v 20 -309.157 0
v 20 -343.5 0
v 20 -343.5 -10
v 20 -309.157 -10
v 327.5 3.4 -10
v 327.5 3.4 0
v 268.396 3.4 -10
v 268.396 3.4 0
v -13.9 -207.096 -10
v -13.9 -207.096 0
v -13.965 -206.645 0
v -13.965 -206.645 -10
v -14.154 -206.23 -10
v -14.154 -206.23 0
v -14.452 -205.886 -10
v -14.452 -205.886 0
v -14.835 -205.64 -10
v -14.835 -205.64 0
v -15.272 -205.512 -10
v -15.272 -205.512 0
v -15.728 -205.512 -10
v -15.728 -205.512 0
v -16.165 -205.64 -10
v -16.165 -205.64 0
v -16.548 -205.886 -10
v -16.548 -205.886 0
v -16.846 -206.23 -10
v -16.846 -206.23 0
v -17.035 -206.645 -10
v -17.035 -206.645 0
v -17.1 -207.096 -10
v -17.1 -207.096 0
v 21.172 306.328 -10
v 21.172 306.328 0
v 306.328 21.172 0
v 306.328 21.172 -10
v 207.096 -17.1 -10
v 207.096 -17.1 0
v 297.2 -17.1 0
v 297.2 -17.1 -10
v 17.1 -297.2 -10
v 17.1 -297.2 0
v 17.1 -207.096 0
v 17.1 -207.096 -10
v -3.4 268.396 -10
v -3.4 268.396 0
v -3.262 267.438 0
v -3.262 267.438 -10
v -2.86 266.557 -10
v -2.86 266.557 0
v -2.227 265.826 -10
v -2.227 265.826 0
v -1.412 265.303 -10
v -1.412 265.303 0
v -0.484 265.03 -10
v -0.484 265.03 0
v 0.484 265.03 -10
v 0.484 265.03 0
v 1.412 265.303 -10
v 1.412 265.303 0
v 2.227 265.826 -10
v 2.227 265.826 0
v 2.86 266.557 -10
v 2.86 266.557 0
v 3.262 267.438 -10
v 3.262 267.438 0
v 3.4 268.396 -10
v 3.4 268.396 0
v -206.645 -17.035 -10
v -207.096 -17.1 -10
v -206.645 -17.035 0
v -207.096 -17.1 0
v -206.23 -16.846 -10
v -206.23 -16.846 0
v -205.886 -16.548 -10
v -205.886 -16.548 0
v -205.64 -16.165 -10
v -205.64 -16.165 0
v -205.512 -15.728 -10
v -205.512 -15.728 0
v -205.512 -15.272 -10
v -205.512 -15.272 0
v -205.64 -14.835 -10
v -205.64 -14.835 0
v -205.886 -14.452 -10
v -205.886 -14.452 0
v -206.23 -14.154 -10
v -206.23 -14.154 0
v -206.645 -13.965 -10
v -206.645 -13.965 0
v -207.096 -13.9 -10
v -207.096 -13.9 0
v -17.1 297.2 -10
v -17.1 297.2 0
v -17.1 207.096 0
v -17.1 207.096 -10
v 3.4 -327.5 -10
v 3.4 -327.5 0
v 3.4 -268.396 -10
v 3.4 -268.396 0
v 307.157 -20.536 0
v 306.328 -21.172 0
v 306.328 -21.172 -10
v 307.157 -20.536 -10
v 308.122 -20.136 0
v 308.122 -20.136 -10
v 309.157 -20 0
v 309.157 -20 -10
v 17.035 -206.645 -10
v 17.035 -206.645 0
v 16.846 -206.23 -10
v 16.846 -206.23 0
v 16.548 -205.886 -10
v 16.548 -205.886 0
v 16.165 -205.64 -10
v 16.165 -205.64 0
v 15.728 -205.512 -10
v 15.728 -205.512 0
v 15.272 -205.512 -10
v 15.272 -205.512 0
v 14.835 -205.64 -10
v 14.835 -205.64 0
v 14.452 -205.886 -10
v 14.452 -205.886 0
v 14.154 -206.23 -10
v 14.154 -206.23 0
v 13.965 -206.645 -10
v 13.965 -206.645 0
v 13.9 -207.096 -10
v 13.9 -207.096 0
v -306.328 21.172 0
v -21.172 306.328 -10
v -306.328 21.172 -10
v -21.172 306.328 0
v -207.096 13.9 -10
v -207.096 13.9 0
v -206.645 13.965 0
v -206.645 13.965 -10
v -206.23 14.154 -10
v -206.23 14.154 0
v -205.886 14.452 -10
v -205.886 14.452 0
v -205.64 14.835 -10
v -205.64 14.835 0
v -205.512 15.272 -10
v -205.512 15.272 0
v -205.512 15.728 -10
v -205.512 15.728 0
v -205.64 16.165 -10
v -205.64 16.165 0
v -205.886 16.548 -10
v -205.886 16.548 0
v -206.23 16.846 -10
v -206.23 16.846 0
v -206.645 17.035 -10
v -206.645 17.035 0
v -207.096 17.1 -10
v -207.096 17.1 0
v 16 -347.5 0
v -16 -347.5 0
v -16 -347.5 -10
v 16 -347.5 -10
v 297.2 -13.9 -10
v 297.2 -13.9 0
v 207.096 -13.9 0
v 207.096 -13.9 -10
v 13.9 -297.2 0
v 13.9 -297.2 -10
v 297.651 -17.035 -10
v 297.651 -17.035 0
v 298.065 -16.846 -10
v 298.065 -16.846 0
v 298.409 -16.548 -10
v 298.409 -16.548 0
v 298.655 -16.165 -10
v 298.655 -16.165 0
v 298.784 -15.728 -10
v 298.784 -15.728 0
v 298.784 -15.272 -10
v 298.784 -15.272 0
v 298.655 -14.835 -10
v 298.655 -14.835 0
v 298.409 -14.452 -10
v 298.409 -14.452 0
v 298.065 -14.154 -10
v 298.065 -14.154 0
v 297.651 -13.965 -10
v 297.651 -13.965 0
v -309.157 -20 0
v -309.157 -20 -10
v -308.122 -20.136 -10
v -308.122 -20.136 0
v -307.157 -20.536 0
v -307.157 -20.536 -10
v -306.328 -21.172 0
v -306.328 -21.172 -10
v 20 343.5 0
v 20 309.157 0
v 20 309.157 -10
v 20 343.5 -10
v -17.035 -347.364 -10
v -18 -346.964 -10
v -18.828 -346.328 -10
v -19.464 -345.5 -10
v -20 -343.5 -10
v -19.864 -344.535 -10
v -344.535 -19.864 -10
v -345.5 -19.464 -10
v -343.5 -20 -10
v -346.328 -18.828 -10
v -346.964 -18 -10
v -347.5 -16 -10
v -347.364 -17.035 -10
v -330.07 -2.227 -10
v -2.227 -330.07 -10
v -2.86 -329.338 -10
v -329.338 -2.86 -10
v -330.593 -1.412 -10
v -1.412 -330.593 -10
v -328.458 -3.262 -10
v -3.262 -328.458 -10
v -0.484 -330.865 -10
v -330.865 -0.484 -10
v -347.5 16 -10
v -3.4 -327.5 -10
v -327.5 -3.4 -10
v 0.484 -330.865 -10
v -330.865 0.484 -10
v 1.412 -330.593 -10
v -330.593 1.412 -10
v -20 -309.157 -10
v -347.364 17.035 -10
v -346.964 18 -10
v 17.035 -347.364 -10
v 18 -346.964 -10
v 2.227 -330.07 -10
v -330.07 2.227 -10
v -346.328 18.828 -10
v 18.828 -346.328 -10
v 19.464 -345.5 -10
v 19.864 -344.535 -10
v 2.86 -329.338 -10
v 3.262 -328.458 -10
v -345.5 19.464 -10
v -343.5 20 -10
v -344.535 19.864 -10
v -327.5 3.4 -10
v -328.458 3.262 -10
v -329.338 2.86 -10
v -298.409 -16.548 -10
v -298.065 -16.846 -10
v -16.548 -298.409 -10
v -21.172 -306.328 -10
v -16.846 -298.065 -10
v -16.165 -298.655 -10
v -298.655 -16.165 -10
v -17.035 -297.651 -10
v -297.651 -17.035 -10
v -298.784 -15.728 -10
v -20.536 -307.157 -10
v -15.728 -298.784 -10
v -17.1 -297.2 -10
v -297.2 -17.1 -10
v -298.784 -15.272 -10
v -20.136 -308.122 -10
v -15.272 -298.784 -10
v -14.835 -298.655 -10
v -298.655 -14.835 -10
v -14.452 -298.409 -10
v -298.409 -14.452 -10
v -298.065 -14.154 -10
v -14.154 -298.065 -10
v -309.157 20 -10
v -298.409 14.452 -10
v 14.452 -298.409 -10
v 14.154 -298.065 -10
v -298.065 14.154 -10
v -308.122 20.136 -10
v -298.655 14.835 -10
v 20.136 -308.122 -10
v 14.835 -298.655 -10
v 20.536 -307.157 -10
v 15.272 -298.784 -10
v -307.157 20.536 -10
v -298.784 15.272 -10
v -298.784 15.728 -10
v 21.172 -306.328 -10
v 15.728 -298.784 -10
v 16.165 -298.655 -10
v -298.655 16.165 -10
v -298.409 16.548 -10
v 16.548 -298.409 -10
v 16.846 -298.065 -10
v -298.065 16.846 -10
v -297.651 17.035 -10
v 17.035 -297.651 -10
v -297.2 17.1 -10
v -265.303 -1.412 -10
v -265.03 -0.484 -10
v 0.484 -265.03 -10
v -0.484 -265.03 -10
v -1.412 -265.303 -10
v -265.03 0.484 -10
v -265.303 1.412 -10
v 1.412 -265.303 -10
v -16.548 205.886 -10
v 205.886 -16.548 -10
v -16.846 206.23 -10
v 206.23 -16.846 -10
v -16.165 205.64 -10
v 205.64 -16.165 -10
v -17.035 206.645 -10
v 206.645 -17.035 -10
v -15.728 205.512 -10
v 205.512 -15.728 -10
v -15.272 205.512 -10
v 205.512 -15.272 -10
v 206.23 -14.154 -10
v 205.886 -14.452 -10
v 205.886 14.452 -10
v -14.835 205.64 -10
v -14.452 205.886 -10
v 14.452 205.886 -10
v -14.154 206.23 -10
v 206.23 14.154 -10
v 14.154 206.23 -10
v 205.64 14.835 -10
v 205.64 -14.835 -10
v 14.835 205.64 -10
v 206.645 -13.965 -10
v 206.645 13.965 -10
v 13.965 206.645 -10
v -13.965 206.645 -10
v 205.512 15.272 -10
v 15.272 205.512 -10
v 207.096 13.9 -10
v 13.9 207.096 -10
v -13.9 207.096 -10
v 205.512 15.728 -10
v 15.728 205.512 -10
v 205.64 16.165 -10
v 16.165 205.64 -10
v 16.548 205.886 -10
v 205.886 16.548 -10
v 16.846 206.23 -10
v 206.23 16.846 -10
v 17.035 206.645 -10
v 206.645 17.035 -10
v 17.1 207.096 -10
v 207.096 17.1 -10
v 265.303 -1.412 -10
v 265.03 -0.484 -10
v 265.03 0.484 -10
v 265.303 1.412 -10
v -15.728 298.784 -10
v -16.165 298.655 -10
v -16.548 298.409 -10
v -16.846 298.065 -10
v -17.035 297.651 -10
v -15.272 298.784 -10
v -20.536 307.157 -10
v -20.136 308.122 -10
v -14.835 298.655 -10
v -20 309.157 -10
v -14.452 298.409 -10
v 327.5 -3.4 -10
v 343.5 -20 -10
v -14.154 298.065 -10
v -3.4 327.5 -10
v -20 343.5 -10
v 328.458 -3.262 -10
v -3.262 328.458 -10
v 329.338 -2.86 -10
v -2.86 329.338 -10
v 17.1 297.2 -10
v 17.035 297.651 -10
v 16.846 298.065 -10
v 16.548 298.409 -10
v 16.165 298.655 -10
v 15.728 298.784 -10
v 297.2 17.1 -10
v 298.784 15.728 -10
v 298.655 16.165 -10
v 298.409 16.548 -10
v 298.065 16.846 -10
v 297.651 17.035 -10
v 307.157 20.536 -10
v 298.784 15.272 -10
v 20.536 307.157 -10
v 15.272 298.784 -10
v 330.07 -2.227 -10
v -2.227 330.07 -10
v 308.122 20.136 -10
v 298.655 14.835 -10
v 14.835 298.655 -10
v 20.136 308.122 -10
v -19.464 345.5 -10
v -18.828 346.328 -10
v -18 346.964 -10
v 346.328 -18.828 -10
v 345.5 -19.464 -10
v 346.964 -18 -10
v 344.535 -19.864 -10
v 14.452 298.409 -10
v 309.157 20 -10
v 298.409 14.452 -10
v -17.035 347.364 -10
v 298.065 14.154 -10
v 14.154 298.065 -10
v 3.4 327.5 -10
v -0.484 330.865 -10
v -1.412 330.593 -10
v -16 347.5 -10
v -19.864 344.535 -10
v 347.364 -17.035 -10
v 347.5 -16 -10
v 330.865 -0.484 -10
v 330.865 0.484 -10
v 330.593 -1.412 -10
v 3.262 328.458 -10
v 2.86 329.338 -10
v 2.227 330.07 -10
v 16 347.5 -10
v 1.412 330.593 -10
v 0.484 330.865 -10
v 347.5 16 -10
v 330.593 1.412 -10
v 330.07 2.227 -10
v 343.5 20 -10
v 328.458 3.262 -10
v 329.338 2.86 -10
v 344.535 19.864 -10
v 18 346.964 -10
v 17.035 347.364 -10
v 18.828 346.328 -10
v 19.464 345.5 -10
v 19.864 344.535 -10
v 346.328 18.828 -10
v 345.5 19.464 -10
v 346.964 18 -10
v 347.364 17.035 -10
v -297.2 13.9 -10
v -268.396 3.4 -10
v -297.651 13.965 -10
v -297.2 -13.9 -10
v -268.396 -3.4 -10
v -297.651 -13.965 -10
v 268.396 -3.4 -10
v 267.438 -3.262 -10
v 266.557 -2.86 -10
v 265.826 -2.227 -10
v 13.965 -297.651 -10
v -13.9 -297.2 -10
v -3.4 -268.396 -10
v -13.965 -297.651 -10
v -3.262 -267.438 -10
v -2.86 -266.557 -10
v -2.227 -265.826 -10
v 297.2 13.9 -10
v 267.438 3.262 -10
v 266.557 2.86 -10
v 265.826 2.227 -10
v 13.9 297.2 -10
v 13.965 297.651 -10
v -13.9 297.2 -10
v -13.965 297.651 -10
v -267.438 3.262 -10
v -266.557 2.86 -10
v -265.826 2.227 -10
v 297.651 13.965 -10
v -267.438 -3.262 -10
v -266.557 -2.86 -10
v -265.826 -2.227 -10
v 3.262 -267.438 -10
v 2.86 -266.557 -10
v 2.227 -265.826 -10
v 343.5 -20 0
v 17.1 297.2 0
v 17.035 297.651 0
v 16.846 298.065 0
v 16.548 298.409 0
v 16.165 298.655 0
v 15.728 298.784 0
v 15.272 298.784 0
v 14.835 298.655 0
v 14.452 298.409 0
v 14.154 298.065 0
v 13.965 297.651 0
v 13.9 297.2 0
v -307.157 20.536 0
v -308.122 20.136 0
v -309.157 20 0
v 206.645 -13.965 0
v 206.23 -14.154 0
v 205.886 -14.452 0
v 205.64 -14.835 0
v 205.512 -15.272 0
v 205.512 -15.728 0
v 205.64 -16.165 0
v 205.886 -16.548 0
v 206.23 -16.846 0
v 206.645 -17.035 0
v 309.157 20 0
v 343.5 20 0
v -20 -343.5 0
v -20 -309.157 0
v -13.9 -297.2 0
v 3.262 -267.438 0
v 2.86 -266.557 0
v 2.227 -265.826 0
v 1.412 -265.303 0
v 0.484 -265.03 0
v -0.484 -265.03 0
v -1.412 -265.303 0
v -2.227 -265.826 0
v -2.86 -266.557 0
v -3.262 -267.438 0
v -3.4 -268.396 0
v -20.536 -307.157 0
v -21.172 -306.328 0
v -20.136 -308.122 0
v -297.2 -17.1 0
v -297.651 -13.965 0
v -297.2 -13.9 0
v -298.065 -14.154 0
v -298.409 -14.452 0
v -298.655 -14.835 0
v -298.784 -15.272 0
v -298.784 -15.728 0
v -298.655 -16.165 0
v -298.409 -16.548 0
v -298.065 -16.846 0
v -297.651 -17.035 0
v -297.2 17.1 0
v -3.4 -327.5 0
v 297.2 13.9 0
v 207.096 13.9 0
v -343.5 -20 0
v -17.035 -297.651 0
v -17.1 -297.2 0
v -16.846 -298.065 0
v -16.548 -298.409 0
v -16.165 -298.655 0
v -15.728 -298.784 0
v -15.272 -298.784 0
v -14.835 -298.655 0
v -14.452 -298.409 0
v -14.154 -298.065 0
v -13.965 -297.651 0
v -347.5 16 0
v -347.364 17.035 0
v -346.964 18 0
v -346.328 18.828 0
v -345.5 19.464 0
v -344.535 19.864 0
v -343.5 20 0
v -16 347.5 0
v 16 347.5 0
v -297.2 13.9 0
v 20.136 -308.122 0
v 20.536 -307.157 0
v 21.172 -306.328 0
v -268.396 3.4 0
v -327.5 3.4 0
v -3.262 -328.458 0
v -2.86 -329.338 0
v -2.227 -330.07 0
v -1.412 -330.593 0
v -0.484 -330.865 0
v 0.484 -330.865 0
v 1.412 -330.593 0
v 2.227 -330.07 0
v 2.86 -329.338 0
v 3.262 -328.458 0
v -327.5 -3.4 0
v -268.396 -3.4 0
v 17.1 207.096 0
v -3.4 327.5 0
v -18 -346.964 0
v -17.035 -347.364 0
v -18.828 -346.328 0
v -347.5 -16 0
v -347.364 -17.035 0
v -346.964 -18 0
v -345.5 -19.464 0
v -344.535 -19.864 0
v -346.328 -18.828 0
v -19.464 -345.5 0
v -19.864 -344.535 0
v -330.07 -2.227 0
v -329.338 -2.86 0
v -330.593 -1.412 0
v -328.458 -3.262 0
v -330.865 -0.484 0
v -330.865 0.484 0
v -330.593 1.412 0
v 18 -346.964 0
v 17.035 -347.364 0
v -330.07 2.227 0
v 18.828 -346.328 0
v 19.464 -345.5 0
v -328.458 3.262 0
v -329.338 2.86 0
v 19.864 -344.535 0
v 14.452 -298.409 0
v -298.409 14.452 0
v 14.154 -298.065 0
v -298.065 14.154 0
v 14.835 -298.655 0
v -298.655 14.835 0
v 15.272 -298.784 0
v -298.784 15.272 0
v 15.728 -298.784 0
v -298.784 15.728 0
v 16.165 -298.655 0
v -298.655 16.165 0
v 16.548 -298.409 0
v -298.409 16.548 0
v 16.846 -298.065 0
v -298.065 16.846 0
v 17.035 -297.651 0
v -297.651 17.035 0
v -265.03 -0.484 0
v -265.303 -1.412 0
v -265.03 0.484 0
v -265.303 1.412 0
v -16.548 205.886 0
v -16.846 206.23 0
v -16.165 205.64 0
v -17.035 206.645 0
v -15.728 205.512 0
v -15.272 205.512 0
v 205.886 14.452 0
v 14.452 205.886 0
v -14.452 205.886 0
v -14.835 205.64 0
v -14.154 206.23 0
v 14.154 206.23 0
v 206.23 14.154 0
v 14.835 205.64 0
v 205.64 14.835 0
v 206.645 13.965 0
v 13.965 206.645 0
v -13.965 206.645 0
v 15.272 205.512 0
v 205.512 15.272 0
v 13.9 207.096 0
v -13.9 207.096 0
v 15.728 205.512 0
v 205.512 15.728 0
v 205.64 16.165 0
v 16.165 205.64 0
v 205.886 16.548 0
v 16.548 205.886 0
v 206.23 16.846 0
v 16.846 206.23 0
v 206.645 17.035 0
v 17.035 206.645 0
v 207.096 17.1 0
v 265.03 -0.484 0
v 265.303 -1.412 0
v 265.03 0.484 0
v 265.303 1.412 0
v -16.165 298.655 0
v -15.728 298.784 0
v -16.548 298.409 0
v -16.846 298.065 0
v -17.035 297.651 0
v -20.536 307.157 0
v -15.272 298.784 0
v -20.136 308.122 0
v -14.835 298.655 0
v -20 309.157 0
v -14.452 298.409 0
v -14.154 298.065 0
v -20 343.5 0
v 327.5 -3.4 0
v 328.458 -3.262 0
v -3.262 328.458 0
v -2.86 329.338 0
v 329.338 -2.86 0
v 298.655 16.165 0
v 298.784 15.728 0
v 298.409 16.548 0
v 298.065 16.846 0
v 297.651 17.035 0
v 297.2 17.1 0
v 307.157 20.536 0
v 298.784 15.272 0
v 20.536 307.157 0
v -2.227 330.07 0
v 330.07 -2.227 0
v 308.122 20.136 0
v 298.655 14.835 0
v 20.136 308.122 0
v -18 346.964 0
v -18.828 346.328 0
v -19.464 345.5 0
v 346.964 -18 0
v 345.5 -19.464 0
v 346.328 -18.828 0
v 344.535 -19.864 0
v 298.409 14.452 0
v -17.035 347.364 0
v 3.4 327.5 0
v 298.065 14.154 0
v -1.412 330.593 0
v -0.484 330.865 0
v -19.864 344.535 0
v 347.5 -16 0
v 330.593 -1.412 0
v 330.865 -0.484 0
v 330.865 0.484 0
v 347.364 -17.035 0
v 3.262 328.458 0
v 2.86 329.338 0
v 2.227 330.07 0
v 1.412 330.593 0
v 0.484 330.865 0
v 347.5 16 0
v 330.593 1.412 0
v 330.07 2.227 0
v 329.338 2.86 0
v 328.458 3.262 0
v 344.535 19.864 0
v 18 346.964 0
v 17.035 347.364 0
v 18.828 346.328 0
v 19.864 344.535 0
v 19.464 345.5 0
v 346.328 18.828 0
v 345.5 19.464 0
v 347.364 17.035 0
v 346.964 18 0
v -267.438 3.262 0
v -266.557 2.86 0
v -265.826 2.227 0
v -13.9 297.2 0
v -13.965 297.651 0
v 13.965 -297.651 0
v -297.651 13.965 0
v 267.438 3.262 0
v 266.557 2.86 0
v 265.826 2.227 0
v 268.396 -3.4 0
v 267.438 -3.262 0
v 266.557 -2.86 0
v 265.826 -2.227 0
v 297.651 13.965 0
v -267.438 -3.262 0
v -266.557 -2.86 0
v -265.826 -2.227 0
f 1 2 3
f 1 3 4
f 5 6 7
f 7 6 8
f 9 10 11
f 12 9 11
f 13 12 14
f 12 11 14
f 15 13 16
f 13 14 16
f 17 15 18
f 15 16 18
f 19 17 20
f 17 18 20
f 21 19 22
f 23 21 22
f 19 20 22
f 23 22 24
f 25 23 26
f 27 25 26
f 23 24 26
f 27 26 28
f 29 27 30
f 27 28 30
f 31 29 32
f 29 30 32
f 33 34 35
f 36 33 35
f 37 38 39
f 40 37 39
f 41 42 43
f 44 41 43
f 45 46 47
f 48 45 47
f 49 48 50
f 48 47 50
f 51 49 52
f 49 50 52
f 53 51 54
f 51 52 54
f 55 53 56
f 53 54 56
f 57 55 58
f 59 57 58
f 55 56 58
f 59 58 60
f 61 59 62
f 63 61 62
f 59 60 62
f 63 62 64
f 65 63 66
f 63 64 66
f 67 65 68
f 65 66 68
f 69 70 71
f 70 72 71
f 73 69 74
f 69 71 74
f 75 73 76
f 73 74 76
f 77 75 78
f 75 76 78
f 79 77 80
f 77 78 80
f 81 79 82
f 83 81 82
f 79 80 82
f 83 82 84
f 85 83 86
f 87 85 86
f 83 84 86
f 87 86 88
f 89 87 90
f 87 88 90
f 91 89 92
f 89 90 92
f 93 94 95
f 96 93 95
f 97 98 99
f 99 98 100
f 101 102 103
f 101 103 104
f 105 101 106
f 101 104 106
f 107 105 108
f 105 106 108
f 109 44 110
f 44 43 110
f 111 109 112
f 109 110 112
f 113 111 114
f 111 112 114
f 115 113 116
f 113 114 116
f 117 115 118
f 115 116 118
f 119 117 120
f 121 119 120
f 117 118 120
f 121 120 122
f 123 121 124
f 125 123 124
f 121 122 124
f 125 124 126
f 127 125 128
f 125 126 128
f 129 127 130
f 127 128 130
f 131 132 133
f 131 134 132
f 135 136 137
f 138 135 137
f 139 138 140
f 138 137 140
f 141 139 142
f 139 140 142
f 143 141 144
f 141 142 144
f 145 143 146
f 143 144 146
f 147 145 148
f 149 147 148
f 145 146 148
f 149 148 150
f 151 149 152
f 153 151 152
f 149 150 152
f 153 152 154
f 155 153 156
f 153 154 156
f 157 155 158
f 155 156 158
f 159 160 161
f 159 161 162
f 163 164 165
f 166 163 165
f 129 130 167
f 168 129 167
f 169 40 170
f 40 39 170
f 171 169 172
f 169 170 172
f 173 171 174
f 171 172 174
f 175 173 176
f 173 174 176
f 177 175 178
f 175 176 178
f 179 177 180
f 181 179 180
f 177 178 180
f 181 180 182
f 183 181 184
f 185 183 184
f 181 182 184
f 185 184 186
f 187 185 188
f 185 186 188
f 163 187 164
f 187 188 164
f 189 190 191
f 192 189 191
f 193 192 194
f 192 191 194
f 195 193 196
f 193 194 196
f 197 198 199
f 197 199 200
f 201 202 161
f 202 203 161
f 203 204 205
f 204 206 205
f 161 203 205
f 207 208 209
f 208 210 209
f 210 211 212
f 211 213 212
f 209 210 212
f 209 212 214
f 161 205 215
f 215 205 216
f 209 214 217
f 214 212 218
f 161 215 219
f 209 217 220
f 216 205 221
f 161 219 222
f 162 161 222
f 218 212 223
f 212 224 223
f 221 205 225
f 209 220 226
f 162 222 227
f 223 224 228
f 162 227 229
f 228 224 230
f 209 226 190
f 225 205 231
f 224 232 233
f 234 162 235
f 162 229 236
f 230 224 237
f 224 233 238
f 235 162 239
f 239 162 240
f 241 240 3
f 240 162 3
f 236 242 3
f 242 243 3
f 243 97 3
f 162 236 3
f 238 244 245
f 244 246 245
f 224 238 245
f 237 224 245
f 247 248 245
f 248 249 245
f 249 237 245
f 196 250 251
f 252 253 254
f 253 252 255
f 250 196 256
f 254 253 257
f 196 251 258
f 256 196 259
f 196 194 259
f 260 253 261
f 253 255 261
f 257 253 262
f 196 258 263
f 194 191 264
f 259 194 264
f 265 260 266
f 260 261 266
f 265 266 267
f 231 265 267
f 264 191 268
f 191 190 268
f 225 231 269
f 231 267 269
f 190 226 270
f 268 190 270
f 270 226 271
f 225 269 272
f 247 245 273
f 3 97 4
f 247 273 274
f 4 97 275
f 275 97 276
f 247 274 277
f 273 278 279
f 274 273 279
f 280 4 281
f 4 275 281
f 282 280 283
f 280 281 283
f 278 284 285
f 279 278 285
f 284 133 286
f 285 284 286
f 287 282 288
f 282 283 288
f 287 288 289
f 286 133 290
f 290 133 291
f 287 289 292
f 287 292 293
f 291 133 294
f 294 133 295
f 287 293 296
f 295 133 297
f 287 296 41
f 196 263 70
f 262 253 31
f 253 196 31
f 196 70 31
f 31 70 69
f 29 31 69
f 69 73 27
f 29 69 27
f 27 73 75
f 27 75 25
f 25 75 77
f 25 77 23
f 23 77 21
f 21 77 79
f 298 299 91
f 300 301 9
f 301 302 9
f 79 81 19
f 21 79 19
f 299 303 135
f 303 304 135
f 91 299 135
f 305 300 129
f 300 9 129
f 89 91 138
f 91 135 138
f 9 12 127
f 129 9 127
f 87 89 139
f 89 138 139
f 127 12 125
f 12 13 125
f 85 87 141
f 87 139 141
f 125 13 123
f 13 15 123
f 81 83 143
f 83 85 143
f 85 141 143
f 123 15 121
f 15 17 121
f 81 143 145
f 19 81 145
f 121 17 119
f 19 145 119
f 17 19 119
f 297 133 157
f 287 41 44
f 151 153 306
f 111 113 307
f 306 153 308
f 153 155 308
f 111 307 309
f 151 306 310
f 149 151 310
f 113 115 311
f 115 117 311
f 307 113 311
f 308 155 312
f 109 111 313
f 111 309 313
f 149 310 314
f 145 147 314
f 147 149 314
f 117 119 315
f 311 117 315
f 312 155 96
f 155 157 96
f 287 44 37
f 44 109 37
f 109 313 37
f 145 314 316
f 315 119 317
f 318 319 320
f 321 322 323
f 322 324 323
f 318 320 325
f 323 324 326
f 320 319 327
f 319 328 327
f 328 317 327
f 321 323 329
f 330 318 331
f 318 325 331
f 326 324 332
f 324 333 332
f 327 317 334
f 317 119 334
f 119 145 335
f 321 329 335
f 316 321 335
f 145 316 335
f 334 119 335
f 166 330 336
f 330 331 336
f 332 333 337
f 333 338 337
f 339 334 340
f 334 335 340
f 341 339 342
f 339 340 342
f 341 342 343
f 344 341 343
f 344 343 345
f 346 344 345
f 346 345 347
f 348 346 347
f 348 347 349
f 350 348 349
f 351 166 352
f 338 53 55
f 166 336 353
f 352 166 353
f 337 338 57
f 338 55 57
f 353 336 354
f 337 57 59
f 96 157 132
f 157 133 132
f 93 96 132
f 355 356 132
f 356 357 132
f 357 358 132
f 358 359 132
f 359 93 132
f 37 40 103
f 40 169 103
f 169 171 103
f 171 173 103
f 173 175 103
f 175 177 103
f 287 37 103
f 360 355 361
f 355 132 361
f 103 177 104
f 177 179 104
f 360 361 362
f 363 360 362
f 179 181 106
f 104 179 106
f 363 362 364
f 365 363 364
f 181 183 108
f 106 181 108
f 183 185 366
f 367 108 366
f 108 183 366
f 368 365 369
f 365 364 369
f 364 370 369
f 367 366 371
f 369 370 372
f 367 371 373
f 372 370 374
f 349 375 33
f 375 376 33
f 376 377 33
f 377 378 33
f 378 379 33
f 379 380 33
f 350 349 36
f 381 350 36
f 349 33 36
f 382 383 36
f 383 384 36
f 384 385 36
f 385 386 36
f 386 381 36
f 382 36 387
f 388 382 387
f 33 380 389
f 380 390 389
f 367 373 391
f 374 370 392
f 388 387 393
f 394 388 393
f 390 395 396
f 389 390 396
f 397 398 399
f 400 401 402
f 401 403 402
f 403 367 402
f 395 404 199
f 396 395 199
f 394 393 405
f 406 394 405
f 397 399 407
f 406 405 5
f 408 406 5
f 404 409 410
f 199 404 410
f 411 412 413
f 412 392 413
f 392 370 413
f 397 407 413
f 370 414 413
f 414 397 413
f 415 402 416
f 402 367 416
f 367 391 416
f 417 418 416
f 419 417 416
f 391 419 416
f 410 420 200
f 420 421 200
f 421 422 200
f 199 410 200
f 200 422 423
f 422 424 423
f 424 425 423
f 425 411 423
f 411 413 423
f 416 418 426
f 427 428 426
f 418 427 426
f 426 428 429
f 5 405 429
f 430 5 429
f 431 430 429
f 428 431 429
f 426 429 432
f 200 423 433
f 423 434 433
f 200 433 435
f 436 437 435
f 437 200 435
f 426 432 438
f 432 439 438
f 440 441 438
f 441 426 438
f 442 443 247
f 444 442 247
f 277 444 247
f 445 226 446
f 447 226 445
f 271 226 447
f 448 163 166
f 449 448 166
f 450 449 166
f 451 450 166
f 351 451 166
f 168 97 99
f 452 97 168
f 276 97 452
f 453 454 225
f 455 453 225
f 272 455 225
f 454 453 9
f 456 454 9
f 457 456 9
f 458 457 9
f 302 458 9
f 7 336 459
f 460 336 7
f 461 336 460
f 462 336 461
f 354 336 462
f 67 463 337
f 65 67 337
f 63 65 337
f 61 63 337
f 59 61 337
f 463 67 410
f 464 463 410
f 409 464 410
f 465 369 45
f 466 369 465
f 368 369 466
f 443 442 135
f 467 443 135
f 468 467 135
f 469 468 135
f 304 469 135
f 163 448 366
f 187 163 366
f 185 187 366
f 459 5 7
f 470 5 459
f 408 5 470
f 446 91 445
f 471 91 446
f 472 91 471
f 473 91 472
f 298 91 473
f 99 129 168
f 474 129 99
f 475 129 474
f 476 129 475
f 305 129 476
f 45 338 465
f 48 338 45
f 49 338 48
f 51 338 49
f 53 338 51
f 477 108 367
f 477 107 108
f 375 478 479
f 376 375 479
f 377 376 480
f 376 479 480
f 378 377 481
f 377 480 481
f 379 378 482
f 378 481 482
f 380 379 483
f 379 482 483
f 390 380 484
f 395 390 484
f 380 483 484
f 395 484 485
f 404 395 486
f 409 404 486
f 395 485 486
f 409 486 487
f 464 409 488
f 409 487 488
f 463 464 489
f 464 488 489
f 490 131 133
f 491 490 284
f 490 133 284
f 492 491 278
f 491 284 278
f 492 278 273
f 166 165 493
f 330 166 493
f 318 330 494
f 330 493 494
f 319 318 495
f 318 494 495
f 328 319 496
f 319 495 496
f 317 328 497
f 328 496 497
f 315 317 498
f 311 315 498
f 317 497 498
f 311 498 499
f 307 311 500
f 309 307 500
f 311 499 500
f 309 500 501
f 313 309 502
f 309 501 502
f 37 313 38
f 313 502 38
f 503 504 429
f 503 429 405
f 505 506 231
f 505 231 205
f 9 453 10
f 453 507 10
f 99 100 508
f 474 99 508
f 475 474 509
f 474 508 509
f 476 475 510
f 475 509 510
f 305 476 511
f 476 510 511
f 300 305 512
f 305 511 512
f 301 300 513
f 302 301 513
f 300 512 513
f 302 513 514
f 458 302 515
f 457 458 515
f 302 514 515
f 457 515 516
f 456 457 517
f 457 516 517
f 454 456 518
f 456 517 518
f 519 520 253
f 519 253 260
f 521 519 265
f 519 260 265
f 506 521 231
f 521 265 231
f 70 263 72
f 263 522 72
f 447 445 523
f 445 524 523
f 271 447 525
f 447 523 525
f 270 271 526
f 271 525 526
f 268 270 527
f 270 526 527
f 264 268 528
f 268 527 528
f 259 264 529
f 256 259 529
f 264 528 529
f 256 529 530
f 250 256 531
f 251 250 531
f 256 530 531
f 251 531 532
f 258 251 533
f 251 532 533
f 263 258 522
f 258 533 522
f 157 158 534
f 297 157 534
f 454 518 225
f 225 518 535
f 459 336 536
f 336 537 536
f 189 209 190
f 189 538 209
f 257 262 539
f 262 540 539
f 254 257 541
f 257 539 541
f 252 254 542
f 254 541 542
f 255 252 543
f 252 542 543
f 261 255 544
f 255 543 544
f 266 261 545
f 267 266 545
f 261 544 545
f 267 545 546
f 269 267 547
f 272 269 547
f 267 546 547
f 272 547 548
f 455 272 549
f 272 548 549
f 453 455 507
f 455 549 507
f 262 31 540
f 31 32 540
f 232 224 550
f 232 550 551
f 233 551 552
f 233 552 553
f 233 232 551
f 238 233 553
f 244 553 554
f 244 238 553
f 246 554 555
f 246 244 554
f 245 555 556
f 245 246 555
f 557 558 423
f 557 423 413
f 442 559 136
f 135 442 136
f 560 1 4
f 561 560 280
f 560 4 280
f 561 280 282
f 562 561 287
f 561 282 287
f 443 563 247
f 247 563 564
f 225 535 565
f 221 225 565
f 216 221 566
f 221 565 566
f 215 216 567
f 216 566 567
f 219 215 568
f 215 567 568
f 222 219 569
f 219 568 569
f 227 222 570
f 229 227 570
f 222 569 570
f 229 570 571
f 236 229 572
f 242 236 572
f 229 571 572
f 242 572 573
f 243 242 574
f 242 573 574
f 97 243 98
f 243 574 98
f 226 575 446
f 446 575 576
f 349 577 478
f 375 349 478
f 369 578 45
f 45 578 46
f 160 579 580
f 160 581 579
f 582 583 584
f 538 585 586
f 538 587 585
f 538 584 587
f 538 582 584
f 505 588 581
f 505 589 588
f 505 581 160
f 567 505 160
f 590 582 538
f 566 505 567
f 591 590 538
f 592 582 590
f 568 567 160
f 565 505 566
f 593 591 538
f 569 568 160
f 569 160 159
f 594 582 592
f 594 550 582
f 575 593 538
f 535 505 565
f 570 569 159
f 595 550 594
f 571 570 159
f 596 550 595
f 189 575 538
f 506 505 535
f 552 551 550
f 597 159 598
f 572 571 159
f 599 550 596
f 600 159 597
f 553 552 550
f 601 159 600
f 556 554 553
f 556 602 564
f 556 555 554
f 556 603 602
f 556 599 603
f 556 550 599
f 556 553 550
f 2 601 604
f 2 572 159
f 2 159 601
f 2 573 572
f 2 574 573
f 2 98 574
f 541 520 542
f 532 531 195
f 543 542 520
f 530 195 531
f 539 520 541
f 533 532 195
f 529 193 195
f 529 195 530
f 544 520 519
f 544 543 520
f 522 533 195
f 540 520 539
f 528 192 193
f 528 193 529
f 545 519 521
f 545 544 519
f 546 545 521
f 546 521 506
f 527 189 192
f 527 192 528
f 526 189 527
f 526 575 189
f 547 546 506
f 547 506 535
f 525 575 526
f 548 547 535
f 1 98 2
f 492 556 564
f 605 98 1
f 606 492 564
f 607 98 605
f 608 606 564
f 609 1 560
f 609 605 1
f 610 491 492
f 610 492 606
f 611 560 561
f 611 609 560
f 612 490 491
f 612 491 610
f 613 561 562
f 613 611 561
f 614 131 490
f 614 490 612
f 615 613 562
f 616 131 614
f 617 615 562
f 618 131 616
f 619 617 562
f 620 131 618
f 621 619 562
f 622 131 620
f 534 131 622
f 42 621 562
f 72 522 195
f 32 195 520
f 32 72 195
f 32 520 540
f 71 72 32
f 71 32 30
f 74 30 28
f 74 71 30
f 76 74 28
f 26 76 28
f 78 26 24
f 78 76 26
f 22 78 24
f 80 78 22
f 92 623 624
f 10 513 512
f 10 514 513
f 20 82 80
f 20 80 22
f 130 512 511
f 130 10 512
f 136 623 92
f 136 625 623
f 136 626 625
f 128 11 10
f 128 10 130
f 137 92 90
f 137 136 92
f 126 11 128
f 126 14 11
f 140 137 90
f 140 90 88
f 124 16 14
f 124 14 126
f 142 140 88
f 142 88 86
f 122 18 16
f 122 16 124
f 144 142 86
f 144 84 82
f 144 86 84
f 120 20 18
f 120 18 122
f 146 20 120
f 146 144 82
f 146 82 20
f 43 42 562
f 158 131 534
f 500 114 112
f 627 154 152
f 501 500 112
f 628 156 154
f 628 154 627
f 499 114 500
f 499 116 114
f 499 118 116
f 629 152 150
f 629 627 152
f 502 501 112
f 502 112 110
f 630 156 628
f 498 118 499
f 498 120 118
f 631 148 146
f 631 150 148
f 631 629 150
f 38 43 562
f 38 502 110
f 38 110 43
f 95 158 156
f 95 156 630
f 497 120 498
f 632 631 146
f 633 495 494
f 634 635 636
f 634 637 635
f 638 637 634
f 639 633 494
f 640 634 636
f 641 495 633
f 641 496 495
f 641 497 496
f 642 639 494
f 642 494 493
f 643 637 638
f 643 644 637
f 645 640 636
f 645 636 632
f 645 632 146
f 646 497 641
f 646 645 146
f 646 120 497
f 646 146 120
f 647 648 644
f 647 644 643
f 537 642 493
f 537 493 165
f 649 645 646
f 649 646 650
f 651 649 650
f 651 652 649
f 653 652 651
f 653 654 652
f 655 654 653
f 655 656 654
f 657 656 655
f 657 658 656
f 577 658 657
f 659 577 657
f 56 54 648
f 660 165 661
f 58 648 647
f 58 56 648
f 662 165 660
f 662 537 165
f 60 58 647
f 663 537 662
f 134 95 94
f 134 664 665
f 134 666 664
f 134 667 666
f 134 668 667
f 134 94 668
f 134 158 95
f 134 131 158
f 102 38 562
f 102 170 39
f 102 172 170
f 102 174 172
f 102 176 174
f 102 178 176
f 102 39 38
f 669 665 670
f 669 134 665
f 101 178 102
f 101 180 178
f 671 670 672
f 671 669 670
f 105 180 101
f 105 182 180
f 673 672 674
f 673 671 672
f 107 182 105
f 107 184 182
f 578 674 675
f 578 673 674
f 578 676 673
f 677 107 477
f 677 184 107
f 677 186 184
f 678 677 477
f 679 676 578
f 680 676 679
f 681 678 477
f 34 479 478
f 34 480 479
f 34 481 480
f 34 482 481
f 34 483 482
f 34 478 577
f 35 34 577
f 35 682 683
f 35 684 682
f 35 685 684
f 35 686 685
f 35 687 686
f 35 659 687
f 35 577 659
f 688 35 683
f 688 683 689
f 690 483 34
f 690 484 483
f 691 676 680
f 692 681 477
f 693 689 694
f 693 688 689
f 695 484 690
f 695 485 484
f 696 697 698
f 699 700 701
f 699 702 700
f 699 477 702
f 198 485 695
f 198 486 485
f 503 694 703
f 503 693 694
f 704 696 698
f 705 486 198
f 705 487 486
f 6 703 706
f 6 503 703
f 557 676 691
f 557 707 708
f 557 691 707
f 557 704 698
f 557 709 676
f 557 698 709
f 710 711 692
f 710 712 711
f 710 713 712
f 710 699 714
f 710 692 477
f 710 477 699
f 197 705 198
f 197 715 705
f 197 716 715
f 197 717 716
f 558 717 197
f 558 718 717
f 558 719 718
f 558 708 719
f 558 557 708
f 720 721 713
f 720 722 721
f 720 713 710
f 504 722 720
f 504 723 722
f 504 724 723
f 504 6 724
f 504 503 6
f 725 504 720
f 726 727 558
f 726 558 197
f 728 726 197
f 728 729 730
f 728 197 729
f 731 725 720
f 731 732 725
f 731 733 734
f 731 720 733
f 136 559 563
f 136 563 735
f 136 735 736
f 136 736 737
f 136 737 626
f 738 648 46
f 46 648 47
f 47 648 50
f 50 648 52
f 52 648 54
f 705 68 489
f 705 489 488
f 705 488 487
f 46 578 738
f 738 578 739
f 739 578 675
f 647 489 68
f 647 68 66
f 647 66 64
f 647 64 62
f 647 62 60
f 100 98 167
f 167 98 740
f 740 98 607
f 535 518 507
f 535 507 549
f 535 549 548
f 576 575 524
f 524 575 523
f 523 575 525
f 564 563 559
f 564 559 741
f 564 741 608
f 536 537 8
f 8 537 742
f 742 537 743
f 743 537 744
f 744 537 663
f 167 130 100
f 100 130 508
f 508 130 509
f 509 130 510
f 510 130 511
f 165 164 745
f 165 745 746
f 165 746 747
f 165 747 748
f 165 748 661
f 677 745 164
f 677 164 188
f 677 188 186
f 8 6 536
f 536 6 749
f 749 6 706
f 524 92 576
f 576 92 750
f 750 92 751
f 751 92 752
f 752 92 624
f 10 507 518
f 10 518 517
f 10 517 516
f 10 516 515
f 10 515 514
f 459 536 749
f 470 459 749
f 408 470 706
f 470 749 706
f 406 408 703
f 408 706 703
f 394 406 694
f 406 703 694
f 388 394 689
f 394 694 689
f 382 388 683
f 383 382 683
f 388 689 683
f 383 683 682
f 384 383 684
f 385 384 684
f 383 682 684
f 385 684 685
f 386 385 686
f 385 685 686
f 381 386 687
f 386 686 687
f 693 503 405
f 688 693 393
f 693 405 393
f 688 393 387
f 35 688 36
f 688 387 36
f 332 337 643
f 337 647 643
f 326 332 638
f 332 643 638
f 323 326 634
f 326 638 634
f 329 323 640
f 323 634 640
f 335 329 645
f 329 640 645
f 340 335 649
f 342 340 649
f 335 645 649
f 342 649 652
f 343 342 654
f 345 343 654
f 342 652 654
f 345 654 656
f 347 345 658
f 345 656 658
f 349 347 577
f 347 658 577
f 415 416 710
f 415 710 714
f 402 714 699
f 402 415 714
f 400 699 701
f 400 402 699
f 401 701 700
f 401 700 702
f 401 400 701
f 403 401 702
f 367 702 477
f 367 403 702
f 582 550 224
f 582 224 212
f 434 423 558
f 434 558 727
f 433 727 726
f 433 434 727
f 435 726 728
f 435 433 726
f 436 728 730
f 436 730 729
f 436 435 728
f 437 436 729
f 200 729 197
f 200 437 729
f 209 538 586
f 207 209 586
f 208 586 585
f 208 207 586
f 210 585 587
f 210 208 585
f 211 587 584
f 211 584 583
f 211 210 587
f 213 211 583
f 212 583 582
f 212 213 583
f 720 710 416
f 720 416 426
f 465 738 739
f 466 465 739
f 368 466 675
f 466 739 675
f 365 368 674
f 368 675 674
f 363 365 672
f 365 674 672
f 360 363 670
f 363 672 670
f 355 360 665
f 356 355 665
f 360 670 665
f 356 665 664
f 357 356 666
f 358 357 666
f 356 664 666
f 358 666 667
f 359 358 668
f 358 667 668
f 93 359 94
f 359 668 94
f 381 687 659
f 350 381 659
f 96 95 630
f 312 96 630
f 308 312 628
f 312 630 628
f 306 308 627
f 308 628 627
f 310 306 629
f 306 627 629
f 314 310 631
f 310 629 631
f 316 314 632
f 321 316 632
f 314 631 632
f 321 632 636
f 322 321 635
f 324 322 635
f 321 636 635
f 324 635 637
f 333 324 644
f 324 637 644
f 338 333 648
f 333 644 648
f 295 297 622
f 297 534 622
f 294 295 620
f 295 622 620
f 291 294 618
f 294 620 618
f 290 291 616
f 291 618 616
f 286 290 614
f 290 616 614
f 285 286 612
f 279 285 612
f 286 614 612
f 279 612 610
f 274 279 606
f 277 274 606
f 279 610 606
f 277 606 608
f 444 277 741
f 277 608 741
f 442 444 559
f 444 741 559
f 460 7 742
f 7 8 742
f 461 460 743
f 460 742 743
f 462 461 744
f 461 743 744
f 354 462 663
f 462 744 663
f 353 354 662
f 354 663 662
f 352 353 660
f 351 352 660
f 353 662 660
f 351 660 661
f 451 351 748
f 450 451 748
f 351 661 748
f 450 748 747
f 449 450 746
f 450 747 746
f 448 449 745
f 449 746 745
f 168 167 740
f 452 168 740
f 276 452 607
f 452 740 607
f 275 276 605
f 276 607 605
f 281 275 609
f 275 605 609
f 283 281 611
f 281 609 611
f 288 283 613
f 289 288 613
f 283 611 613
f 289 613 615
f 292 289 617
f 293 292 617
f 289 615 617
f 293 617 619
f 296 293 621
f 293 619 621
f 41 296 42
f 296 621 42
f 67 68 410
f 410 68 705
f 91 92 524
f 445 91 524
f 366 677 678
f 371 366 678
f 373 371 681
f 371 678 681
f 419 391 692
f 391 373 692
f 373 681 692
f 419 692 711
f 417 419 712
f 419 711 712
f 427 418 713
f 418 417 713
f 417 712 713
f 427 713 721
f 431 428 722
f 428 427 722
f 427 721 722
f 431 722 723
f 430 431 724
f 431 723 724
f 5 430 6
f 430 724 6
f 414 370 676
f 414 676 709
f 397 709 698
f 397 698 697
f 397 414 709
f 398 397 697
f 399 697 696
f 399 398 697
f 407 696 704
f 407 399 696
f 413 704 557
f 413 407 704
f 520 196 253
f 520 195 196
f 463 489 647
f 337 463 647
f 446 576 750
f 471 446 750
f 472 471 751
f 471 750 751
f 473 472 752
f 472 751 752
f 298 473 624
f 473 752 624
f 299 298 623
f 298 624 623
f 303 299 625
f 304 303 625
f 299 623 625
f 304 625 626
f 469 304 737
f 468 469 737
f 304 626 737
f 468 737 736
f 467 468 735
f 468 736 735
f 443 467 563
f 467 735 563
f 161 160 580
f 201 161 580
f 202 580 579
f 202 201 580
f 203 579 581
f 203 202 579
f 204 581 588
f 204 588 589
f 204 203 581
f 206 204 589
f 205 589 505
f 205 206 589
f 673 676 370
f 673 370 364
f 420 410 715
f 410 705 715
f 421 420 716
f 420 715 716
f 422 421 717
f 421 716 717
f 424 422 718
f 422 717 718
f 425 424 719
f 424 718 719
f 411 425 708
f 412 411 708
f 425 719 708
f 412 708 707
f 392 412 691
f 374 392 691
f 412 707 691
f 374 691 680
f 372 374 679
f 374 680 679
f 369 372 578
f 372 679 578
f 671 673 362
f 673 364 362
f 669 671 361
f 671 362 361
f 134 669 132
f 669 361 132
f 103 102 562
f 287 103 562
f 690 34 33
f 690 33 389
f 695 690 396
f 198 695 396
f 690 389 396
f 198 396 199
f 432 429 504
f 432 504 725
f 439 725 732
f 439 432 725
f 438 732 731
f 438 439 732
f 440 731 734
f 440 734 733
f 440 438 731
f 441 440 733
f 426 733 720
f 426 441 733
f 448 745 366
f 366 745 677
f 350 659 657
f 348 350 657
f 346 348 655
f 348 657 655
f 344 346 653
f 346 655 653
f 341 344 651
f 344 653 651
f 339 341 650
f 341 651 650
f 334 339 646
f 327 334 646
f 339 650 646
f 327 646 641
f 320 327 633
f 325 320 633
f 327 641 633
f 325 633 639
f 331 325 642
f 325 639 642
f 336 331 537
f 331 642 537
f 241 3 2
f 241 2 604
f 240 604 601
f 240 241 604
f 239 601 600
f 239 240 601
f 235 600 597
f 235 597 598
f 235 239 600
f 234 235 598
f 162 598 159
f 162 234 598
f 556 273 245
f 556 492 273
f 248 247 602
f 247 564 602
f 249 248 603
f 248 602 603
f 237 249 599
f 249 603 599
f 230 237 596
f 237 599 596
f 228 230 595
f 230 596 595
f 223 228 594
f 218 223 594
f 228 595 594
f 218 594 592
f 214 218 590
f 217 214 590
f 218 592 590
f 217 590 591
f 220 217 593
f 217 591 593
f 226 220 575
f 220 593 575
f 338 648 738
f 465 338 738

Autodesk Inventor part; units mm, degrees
ref_plane "YZ Plane" through (0, 0, 0) normal (1, 0, 0) x (0, 1, 0)
ref_plane "XZ Plane" through (0, 0, 0) normal (0, 1, 0) x (-1, 0, 0)
ref_plane "XY Plane" through (0, 0, 0) normal (0, 0, 1) x (1, 0, 0)
sketch "Sketch2" plane through (0, 0, 0) normal (0, 0, 1) x (1, 0, 0)
  circle A0 centre (0, 0) radius 327.5 construction
  line L0 (260.6, -21.1) -> (302.8, -21.1) construction
  line L1 (302.8, -21.1) -> (302.8, 21.1) construction
  line L2 (302.8, 21.1) -> (260.6, 21.1) construction
  line L3 (260.6, 21.1) -> (260.6, -21.1) construction
  line L4 (260.6, -21.1) -> (302.8, 21.1) construction
  line L5 (302.8, -21.1) -> (260.6, 21.1) construction
  line L6 (297.2, 15.5) -> (207.0955, 15.5) construction
  line L7 (297.2, 17.1) -> (207.0955, 17.1)
  line L8 (207.0955, 13.9) -> (297.2, 13.9)
  arc A1 (297.2, 13.9) -> (297.2, 17.1) centre (297.2, 15.5) ccw
  arc A2 (207.0955, 17.1) -> (207.0955, 13.9) centre (207.0955, 15.5) ccw
  line L9 (297.2, -15.5) -> (207.0955, -15.5) construction
  line L10 (297.2, -13.9) -> (207.0955, -13.9)
  line L11 (207.0955, -17.1) -> (297.2, -17.1)
  arc A3 (297.2, -17.1) -> (297.2, -13.9) centre (297.2, -15.5) ccw
  arc A4 (207.0955, -13.9) -> (207.0955, -17.1) centre (207.0955, -15.5) ccw
  line L12 (327.5, 0) -> (268.3955, 0) construction
  line L13 (327.5, 3.4) -> (268.3955, 3.4)
  line L14 (268.3955, -3.4) -> (327.5, -3.4)
  arc A5 (327.5, -3.4) -> (327.5, 3.4) centre (327.5, 0) ccw
  arc A6 (268.3955, 3.4) -> (268.3955, -3.4) centre (268.3955, 0) ccw
  line L15 (307.5, -20) -> (347.5, -20)
  line L16 (347.5, -20) -> (347.5, 20)
  line L17 (347.5, 20) -> (307.5, 20)
  line L18 (307.5, 20) -> (307.5, -20)
  line L19 (307.5, -20) -> (347.5, 20) construction
  line L20 (347.5, -20) -> (307.5, 20) construction
  circle A7 centre (327.5, 0) radius 3.4
  arc A8 (-3.4, 268.3955) -> (3.4, 268.3955) centre (0, 268.3955) ccw
  line L21 (-13.9, 207.0955) -> (-13.9, 297.2)
  line L22 (-17.1, 297.2) -> (-17.1, 207.0955)
  line L23 (-15.5, 297.2) -> (-15.5, 207.0955) construction
  line L24 (17.1, 207.0955) -> (17.1, 297.2)
  line L25 (15.5, 297.2) -> (15.5, 207.0955) construction
  line L26 (13.9, 297.2) -> (13.9, 207.0955)
  arc A9 (-17.1, 207.0955) -> (-13.9, 207.0955) centre (-15.5, 207.0955) ccw
  arc A10 (13.9, 207.0955) -> (17.1, 207.0955) centre (15.5, 207.0955) ccw
  line L27 (21.1, 302.8) -> (-21.1, 302.8) construction
  arc A11 (-13.9, 297.2) -> (-17.1, 297.2) centre (-15.5, 297.2) ccw
  arc A12 (17.1, 297.2) -> (13.9, 297.2) centre (15.5, 297.2) ccw
  line L28 (0, 327.5) -> (0, 268.3955) construction
  line L29 (-3.4, 327.5) -> (-3.4, 268.3955)
  line L30 (3.4, 268.3955) -> (3.4, 327.5)
  line L31 (21.1, 260.6) -> (21.1, 302.8) construction
  line L32 (21.1, 302.8) -> (-21.1, 260.6) construction
  line L33 (-21.1, 260.6) -> (21.1, 260.6) construction
  line L34 (21.1, 260.6) -> (-21.1, 302.8) construction
  line L35 (-21.1, 302.8) -> (-21.1, 260.6) construction
  line L36 (-20, 307.5) -> (20, 307.5)
  arc A13 (3.4, 327.5) -> (-3.4, 327.5) centre (0, 327.5) ccw
  circle A14 centre (0, 327.5) radius 3.4
  line L37 (20, 307.5) -> (20, 347.5)
  line L38 (-20, 347.5) -> (-20, 307.5)
  line L39 (20, 307.5) -> (-20, 347.5) construction
  line L40 (20, 347.5) -> (-20, 307.5) construction
  line L41 (20, 347.5) -> (-20, 347.5)
  arc A15 (-268.3955, -3.4) -> (-268.3955, 3.4) centre (-268.3955, 0) ccw
  line L42 (-207.0955, -13.9) -> (-297.2, -13.9)
  line L43 (-297.2, -17.1) -> (-207.0955, -17.1)
  line L44 (-297.2, -15.5) -> (-207.0955, -15.5) construction
  line L45 (-207.0955, 17.1) -> (-297.2, 17.1)
  line L46 (-297.2, 15.5) -> (-207.0955, 15.5) construction
  line L47 (-297.2, 13.9) -> (-207.0955, 13.9)
  arc A16 (-207.0955, -17.1) -> (-207.0955, -13.9) centre (-207.0955, -15.5) ccw
  arc A17 (-207.0955, 13.9) -> (-207.0955, 17.1) centre (-207.0955, 15.5) ccw
  line L48 (-302.8, 21.1) -> (-302.8, -21.1) construction
  arc A18 (-297.2, -13.9) -> (-297.2, -17.1) centre (-297.2, -15.5) ccw
  arc A19 (-297.2, 17.1) -> (-297.2, 13.9) centre (-297.2, 15.5) ccw
  line L49 (-327.5, 0) -> (-268.3955, 0) construction
  line L50 (-327.5, -3.4) -> (-268.3955, -3.4)
  line L51 (-268.3955, 3.4) -> (-327.5, 3.4)
  line L52 (-260.6, 21.1) -> (-302.8, 21.1) construction
  line L53 (-302.8, 21.1) -> (-260.6, -21.1) construction
  line L54 (-260.6, -21.1) -> (-260.6, 21.1) construction
  line L55 (-260.6, 21.1) -> (-302.8, -21.1) construction
  line L56 (-302.8, -21.1) -> (-260.6, -21.1) construction
  line L57 (-307.5, -20) -> (-307.5, 20)
  arc A20 (-327.5, 3.4) -> (-327.5, -3.4) centre (-327.5, 0) ccw
  circle A21 centre (-327.5, 0) radius 3.4
  line L58 (-307.5, 20) -> (-347.5, 20)
  line L59 (-347.5, -20) -> (-307.5, -20)
  line L60 (-307.5, 20) -> (-347.5, -20) construction
  line L61 (-347.5, 20) -> (-307.5, -20) construction
  line L62 (-347.5, 20) -> (-347.5, -20)
  arc A22 (3.4, -268.3955) -> (-3.4, -268.3955) centre (0, -268.3955) ccw
  line L63 (13.9, -207.0955) -> (13.9, -297.2)
  line L64 (17.1, -297.2) -> (17.1, -207.0955)
  line L65 (15.5, -297.2) -> (15.5, -207.0955) construction
  line L66 (-17.1, -207.0955) -> (-17.1, -297.2)
  line L67 (-15.5, -297.2) -> (-15.5, -207.0955) construction
  line L68 (-13.9, -297.2) -> (-13.9, -207.0955)
  arc A23 (17.1, -207.0955) -> (13.9, -207.0955) centre (15.5, -207.0955) ccw
  arc A24 (-13.9, -207.0955) -> (-17.1, -207.0955) centre (-15.5, -207.0955) ccw
  line L69 (-21.1, -302.8) -> (21.1, -302.8) construction
  arc A25 (13.9, -297.2) -> (17.1, -297.2) centre (15.5, -297.2) ccw
  arc A26 (-17.1, -297.2) -> (-13.9, -297.2) centre (-15.5, -297.2) ccw
  line L70 (0, -327.5) -> (0, -268.3955) construction
  line L71 (3.4, -327.5) -> (3.4, -268.3955)
  line L72 (-3.4, -268.3955) -> (-3.4, -327.5)
  line L73 (-21.1, -260.6) -> (-21.1, -302.8) construction
  line L74 (-21.1, -302.8) -> (21.1, -260.6) construction
  line L75 (21.1, -260.6) -> (-21.1, -260.6) construction
  line L76 (-21.1, -260.6) -> (21.1, -302.8) construction
  line L77 (21.1, -302.8) -> (21.1, -260.6) construction
  line L78 (20, -307.5) -> (-20, -307.5)
  arc A27 (-3.4, -327.5) -> (3.4, -327.5) centre (0, -327.5) ccw
  circle A28 centre (0, -327.5) radius 3.4
  line L79 (-20, -307.5) -> (-20, -347.5)
  line L80 (20, -347.5) -> (20, -307.5)
  line L81 (-20, -307.5) -> (20, -347.5) construction
  line L82 (-20, -347.5) -> (20, -307.5) construction
  line L83 (-20, -347.5) -> (20, -347.5)
  line L84 (-20, 307.5) -> (-307.5, 20)
  line L85 (-307.5, -20) -> (-20, -307.5)
  line L86 (307.5, -20) -> (20, -307.5)
  line L87 (20, 307.5) -> (307.5, 20)
  point P0 (281.7, 0)
  point P1 (252.1478, 15.5)
  point P2 (252.1478, -15.5)
  point P3 (297.9478, 0)
  point P4 (15.5, 252.1478)
  point P5 (0, 281.7)
  point P6 (-15.5, 252.1478)
  point P7 (0, 297.9478)
  point P8 (-252.1478, 15.5)
  point P9 (-281.7, 0)
  point P10 (-252.1478, -15.5)
  point P11 (-297.9478, 0)
  point P12 (-15.5, -252.1478)
  point P13 (0, -281.7)
  point P14 (15.5, -252.1478)
  point P15 (0, -297.9478)
  dimension "d26" = 655
  dimension "d110" = 42.2
  dimension "d113" = 42.2
  dimension "d114" = 3.2
  dimension "d115" = 90.1045
  dimension "d116" = 5.6
  dimension "d117" = 3.2
  dimension "d118" = 5.6
  dimension "d119" = 90.1045
  dimension "d122" = 59.1045
  dimension "d123" = 6.8
  dimension "d134" = 40
  dimension "d135" = 40
  dimension "d136" = 6.8
  dimension "d137" = 327.5
  dimension "d138" = 4.7
  dimension "d141" = 360
extrude "Extrusion9" add sketch "Sketch2" against normal blind 10 contours L13 L18 L17 L16 L15 L14 A5 | L13 A6 L14 L18 L86 L78 L71 A22 L72 L85 L57 L50 A15 L51 L84 L36 L29 A8 L30 L87 | L36 L30 A13 L29 L38 L41 L37 | L80 L83 L79 L78 L72 A27 L71 | L57 L51 A20 L50 L59 L62 L58
fillet "Fillet7" radius 4 16 edges at (20, 347.5, -5) (20, 307.5, -5) (-20, 347.5, -5) (-20, 307.5, -5) (-347.5, 20, -5) (-307.5, 20, -5) (-347.5, -20, -5) (-307.5, -20, -5) (-20, -347.5, -5) (-20, -307.5, -5) (347.5, -20, -5) (20, -347.5, -5) (307.5, 20, -5) (347.5, 20, -5) (20, -307.5, -5) (307.5, -20, -5)
equation "\"d26\" = ring_outer_diam + bar_width"
equation "\"ring_inner_diam\" = 565"
equation "\"bar_width\" = 40"
equation "\"bar_hole_diam\" = 6.8"
equation "\"ring_outer_diam\" = 615"
equation "\"motor_width\" = 42.2"
equation "\"dist_motor_bar\" = 4.7"
equation "\"motor_slot_diam\" = 3.2"
equation "\"motor_hole_edge_dist\" = 5.6"
equation "\"motor_slot_length\" = 90.1045"
equation "\"bar_slot_diam\" = 6.8"
equation "\"bar_slot_length\" = 59.1045"
equation "\"dist_motor_holes\" = 31"
equation "\"diag_dist_bar_holes_old_fridge\" = 536.791"
properties part number "base_plate" material "Aluminum 6061"
